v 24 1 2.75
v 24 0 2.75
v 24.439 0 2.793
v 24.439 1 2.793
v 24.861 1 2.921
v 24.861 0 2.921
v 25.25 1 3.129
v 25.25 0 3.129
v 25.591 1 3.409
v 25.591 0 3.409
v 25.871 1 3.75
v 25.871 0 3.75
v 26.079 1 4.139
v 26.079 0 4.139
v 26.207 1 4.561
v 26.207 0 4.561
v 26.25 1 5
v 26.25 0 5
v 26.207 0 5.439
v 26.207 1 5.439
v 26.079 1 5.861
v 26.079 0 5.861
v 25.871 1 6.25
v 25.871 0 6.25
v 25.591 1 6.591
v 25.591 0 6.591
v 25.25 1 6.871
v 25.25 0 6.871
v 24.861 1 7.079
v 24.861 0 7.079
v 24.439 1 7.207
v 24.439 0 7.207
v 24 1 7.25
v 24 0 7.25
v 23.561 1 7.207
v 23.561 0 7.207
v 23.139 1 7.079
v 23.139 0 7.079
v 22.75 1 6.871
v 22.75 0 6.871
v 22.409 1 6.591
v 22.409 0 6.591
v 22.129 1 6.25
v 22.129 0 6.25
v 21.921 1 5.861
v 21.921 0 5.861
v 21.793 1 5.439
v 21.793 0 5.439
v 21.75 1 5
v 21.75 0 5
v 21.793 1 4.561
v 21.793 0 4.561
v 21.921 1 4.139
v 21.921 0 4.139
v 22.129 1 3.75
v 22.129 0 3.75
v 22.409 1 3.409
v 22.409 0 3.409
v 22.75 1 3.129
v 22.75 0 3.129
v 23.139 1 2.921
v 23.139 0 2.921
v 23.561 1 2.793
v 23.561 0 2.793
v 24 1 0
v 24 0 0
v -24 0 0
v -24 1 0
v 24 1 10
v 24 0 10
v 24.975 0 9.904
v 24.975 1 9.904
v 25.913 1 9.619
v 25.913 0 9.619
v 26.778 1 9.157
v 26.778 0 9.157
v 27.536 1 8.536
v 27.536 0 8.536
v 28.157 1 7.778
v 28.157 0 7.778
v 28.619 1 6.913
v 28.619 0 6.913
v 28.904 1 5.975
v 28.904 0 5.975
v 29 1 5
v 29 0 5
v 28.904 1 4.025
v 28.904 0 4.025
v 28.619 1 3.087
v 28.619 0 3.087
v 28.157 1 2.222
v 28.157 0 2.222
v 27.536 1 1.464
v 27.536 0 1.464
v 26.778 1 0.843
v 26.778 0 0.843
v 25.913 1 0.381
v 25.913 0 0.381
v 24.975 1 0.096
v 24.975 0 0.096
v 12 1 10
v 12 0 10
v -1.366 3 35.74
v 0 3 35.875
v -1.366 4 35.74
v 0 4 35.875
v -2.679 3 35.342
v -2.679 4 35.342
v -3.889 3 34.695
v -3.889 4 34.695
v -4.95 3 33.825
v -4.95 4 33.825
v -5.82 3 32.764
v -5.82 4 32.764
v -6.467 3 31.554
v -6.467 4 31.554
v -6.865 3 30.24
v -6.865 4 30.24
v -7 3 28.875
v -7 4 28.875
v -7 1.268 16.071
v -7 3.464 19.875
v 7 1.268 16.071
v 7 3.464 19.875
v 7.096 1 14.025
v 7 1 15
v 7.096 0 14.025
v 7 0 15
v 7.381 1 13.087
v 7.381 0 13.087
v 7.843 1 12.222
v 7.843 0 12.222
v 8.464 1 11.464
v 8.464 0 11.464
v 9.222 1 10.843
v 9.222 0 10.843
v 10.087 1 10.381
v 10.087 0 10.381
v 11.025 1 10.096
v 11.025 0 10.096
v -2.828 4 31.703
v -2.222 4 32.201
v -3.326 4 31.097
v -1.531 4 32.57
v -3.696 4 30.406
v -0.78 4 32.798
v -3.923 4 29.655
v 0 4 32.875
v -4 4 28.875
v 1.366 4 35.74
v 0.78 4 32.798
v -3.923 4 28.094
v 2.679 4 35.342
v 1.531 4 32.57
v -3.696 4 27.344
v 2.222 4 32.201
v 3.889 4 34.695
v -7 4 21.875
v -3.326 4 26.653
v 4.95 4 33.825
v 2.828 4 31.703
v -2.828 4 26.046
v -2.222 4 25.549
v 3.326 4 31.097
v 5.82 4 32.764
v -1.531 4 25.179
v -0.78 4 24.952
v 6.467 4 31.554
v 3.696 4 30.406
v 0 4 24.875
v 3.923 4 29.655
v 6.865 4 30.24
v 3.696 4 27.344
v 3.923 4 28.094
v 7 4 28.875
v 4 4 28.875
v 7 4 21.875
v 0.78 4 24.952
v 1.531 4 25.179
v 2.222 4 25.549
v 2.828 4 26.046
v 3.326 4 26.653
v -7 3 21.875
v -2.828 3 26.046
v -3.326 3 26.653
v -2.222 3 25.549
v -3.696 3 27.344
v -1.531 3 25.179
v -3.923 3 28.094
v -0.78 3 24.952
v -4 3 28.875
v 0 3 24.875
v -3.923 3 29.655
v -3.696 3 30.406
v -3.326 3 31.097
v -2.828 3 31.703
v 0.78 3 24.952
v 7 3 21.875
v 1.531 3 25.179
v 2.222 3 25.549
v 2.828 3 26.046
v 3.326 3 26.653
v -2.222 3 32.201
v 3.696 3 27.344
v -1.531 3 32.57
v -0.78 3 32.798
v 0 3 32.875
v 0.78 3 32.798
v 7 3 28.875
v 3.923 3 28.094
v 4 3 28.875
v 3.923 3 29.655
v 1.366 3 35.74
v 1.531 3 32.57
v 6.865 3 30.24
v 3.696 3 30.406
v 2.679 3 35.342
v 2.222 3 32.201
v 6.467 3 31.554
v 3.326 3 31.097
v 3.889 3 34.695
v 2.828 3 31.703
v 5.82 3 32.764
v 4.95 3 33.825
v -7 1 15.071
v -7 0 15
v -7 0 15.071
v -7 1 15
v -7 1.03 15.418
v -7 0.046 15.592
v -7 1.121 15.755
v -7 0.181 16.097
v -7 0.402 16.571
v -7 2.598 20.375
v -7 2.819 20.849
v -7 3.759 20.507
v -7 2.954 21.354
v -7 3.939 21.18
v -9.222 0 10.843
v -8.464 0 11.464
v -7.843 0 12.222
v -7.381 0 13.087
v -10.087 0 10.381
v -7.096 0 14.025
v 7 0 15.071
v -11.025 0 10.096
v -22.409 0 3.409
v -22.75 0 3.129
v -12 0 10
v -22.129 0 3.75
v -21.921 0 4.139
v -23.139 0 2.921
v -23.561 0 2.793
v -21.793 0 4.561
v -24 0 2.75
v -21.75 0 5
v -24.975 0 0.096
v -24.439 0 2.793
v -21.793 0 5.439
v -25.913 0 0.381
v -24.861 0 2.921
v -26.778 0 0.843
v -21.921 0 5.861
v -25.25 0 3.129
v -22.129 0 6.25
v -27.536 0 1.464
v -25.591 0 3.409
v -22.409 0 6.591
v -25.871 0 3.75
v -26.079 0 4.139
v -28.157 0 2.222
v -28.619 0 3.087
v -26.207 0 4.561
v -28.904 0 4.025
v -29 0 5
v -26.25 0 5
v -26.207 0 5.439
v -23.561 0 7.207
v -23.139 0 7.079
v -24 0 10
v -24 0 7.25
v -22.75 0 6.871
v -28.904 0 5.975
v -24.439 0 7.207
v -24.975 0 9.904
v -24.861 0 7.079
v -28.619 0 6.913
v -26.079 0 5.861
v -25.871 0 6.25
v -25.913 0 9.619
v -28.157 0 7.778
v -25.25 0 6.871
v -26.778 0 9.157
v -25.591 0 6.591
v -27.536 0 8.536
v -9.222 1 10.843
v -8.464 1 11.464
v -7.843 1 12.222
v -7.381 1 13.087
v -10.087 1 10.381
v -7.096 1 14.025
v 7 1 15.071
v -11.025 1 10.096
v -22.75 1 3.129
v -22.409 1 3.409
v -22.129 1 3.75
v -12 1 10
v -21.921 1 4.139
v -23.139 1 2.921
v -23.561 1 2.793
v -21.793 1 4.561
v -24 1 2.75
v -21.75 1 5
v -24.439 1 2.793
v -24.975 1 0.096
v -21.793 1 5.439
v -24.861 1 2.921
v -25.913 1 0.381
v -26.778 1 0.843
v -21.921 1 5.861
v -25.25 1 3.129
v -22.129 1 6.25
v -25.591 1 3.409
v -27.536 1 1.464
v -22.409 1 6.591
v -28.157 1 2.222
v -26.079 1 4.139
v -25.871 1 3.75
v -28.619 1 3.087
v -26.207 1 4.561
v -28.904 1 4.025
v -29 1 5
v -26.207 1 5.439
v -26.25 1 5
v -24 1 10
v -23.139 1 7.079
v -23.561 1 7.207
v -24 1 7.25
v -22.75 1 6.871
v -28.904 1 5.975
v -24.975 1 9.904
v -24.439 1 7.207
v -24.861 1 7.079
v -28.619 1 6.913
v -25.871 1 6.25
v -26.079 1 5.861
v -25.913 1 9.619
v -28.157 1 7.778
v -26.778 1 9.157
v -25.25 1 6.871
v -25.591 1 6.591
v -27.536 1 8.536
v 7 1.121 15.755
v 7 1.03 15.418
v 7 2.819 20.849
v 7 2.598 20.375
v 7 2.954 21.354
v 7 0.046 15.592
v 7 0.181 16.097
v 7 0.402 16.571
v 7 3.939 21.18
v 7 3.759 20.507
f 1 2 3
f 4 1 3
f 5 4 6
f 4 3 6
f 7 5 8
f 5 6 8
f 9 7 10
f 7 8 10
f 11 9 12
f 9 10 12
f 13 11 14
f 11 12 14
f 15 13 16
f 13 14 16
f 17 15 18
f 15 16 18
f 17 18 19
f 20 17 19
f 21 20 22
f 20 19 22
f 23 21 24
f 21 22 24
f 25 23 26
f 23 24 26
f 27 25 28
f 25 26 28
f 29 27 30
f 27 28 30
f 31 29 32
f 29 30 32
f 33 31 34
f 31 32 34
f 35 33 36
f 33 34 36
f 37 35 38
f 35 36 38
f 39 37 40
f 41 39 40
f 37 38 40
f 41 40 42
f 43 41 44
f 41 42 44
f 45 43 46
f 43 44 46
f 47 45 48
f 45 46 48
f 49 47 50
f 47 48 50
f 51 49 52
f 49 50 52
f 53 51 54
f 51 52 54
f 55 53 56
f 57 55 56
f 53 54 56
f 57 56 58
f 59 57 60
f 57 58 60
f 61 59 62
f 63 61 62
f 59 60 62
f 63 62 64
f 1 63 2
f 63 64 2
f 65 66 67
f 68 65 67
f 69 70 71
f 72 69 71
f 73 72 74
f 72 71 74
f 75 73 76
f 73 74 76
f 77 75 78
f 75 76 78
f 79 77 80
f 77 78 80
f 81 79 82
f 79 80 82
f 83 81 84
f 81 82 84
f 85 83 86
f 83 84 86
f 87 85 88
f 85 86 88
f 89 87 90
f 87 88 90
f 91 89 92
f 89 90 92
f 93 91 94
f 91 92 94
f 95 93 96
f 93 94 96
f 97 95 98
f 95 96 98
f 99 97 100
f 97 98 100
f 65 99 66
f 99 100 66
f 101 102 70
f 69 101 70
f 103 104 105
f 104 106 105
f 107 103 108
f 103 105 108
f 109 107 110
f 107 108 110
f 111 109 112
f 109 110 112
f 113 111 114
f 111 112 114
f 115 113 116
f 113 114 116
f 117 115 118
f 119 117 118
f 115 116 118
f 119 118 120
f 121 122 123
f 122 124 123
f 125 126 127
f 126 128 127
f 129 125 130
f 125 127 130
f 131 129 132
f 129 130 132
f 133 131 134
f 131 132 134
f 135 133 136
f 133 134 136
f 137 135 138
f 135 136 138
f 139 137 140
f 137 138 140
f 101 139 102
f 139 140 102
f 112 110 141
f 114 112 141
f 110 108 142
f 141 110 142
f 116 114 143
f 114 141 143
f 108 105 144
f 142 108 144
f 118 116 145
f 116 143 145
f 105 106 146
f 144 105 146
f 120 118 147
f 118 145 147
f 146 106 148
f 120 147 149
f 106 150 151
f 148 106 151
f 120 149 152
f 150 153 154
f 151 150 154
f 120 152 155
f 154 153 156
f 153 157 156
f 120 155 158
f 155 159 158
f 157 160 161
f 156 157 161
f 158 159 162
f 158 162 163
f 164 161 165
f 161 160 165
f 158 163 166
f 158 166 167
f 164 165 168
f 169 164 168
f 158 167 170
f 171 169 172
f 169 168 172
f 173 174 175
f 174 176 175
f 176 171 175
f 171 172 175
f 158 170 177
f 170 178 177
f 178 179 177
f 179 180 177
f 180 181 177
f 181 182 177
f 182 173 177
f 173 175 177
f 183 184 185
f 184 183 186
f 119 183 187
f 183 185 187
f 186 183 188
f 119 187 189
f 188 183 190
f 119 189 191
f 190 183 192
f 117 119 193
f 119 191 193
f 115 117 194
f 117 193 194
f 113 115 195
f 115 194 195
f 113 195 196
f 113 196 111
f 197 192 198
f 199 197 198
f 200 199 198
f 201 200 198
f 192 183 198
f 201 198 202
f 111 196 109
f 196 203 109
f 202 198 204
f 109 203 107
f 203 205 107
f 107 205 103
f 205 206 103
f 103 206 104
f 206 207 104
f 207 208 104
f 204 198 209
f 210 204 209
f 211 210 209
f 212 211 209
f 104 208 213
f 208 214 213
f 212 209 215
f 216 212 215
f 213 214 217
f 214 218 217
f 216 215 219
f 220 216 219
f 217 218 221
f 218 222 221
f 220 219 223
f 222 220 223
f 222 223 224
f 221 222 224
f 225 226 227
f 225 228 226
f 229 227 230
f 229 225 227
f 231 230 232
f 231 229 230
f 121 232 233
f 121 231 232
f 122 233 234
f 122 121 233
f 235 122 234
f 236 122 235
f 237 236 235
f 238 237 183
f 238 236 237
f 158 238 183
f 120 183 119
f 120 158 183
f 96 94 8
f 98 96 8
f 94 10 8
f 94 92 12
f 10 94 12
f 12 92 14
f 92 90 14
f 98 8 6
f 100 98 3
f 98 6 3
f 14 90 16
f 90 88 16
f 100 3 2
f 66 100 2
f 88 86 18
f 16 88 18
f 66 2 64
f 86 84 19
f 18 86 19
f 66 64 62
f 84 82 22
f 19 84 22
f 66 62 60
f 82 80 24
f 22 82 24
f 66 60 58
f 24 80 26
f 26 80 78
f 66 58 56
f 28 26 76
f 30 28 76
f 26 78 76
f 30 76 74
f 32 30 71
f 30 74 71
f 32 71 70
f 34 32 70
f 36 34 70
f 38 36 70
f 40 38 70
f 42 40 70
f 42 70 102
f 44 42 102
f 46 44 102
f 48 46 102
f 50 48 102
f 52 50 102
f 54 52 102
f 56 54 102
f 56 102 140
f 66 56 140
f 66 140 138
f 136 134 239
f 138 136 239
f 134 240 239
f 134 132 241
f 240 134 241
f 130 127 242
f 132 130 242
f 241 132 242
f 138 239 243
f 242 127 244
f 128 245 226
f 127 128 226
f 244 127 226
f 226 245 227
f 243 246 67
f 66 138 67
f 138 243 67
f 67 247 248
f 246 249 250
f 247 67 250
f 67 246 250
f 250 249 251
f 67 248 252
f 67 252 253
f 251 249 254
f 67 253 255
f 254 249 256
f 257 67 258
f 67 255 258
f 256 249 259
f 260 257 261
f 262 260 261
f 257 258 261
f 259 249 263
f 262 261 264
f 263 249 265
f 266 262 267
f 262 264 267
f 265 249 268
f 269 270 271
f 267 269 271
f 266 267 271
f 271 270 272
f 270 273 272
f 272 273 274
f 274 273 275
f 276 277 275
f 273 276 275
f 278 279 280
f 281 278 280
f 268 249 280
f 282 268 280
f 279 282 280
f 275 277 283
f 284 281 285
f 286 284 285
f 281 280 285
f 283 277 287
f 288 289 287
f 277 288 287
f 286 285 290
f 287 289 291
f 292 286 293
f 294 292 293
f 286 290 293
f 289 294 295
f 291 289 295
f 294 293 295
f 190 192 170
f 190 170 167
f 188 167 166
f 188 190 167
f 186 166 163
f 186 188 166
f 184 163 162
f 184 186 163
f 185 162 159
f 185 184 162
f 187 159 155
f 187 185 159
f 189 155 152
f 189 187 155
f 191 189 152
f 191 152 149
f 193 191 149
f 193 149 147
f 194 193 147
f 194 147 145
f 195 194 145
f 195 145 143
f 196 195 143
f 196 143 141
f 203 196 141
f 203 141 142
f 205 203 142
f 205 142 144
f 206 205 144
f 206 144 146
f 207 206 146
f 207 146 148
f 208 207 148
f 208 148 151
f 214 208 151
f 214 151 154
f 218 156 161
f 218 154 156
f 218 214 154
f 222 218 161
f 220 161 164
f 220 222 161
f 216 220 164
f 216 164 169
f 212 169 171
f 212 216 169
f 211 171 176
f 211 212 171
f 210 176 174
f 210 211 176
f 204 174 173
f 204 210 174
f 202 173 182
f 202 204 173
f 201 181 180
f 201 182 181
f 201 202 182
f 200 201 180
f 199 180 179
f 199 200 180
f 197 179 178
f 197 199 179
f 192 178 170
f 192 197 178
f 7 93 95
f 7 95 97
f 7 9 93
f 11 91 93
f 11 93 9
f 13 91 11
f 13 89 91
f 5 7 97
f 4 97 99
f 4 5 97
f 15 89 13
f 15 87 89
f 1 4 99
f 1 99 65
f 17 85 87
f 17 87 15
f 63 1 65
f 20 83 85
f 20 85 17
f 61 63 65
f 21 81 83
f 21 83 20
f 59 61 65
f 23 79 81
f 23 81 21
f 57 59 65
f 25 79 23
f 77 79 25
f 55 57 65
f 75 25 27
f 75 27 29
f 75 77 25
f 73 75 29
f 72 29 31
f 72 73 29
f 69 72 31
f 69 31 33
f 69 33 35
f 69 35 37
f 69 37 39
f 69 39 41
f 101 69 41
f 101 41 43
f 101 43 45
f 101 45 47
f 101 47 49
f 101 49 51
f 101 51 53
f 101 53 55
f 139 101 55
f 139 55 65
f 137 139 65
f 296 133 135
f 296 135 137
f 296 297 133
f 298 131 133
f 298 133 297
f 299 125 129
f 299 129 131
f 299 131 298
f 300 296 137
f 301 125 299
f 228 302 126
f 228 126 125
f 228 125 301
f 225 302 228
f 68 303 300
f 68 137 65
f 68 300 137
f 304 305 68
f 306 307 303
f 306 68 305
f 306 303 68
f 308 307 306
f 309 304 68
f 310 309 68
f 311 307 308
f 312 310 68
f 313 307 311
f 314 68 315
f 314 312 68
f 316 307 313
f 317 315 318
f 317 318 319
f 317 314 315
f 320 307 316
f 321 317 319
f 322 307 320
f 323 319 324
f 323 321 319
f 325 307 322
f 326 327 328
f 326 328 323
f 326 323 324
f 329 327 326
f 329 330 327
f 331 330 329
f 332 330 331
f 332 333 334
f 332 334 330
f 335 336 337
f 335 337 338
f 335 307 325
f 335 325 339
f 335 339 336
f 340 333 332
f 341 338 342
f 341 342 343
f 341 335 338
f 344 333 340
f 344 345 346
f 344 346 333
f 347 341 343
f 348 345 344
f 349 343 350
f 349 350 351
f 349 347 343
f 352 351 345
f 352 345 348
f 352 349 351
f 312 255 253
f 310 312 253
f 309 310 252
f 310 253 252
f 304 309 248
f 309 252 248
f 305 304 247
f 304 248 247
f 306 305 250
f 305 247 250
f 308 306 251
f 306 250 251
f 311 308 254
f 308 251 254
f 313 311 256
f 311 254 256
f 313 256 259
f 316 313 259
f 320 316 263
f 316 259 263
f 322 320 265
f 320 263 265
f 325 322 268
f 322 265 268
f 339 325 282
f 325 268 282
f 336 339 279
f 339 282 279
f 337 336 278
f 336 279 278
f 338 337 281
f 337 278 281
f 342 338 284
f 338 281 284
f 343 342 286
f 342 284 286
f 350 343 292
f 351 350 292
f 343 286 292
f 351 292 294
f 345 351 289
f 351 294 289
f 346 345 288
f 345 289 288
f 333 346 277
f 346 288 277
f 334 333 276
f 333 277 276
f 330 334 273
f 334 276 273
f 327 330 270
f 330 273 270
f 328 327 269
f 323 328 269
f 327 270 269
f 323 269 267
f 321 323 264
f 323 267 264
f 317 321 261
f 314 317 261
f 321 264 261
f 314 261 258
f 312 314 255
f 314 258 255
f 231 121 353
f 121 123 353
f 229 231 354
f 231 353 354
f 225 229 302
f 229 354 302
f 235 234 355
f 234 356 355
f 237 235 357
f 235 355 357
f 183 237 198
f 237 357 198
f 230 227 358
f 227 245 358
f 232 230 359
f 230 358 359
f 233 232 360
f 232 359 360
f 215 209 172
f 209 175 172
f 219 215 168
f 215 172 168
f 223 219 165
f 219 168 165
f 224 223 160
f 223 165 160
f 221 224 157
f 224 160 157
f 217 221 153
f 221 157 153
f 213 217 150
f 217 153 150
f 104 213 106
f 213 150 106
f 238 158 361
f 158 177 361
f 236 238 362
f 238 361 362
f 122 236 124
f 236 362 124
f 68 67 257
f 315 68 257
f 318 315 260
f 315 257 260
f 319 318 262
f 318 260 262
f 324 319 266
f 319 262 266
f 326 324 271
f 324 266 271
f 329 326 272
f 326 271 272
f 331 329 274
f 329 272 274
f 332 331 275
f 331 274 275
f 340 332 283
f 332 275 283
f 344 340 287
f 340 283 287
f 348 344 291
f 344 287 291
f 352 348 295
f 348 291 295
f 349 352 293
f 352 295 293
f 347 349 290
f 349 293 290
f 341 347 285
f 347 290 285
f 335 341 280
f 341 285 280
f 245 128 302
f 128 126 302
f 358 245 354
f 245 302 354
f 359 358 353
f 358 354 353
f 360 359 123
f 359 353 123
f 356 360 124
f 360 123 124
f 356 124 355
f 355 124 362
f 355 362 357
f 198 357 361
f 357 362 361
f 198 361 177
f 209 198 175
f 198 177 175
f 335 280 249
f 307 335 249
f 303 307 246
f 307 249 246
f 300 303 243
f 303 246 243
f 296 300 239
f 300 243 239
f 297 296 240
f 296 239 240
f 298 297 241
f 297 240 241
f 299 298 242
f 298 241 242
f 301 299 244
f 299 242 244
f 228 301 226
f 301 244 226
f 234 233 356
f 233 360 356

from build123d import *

# Parameters (mm, degrees)
EXTRUDE_THIN1_DEPTH     = 7
FILLET1_R               = 7
CUT_EXTRUDE1_DEPTH      = 10
CUT_EXTRUDE1_DEPTH_BACK = 10
SKETCH2_R               = 4
SKETCH3_R               = 2.25
BOSS_EXTRUDE1_DEPTH     = 1
FILLET2_R               = 5


with BuildPart() as part:
    # Sketch1 → Extrude-Thin1 (new, symmetric)
    with BuildSketch(Plane(origin=(0, 0, 0), x_dir=(0, 0, -1), z_dir=(1, 0, 0))):
        with BuildLine():
            Line((0, 0), (-15.070934652, 0))
            ThreePointArc((-15.070934652, 0), (-15.847391787, 0.102222521), (-16.570934652, 0.401923789))
            Line((-16.570934652, 0.401923789), (-20.374782229, 2.598076211))
            ThreePointArc((-20.374782229, 2.598076211), (-21.098325094, 2.897777479), (-21.874782229, 3))
            Line((-21.874782229, 3), (-35.874782229, 3))
            Line((-35.874782229, 3), (-35.874782229, 4))
            Line((-35.874782229, 4), (-21.874782229, 4))
            ThreePointArc((-21.874782229, 4), (-20.839506049, 3.863703305), (-19.874782229, 3.464101615))
            Line((-19.874782229, 3.464101615), (-16.070934652, 1.267949192))
            ThreePointArc((-16.070934652, 1.267949192), (-15.588572742, 1.068148347), (-15.070934652, 1))
            Line((-15.070934652, 1), (0, 1))
            Line((0, 1), (0, 0))
        make_face()
    extrude(amount=EXTRUDE_THIN1_DEPTH, both=True)

    # Fillet1
    fillet1_edges = [part.edges().sort_by_distance(p)[0] for p in [
        (-7, 3.5, 35.874782229),
        (7, 3.5, 35.874782229),
    ]]
    fillet(fillet1_edges, radius=FILLET1_R - 0.0001)  # a hair under: the kernel refuses the full size

    # Sketch2 → Cut-Extrude1 (cut, two sides: drawn at the far end of the back side and taken through both)
    with BuildSketch(Plane(origin=(0, 1, 0), x_dir=(1, 0, 0), z_dir=(0, 1, 0)).offset(-CUT_EXTRUDE1_DEPTH_BACK)):
        with Locations(Location((0, -28.874782229, 0), (0, 0, 90))):
            Circle(SKETCH2_R)
    extrude(amount=CUT_EXTRUDE1_DEPTH + CUT_EXTRUDE1_DEPTH_BACK, mode=Mode.SUBTRACT)

    # Sketch3 → Boss-Extrude1 (add)
    with BuildSketch(Plane.XZ):
        with BuildLine():
            Line((24, 0), (-24, 0))
            ThreePointArc((-24, 0), (-29, 5), (-24, 10))
            Line((-24, 10), (24, 10))
            ThreePointArc((24, 10), (29, 5), (24, 0))
        make_face()
        with Locations(Location((24, 5, 0), (0, 0, 270))):
            Circle(SKETCH3_R, mode=Mode.SUBTRACT)
        with Locations(Location((-24, 5, 0), (0, 0, 270))):
            Circle(SKETCH3_R, mode=Mode.SUBTRACT)
    extrude(amount=-BOSS_EXTRUDE1_DEPTH)

    # Fillet2
    fillet2_edges = [part.edges().sort_by_distance(p)[0] for p in [
        (-7, 0.5, 10),
        (7, 0.5, 10),
    ]]
    fillet(fillet2_edges, radius=FILLET2_R)


solid = part.part
